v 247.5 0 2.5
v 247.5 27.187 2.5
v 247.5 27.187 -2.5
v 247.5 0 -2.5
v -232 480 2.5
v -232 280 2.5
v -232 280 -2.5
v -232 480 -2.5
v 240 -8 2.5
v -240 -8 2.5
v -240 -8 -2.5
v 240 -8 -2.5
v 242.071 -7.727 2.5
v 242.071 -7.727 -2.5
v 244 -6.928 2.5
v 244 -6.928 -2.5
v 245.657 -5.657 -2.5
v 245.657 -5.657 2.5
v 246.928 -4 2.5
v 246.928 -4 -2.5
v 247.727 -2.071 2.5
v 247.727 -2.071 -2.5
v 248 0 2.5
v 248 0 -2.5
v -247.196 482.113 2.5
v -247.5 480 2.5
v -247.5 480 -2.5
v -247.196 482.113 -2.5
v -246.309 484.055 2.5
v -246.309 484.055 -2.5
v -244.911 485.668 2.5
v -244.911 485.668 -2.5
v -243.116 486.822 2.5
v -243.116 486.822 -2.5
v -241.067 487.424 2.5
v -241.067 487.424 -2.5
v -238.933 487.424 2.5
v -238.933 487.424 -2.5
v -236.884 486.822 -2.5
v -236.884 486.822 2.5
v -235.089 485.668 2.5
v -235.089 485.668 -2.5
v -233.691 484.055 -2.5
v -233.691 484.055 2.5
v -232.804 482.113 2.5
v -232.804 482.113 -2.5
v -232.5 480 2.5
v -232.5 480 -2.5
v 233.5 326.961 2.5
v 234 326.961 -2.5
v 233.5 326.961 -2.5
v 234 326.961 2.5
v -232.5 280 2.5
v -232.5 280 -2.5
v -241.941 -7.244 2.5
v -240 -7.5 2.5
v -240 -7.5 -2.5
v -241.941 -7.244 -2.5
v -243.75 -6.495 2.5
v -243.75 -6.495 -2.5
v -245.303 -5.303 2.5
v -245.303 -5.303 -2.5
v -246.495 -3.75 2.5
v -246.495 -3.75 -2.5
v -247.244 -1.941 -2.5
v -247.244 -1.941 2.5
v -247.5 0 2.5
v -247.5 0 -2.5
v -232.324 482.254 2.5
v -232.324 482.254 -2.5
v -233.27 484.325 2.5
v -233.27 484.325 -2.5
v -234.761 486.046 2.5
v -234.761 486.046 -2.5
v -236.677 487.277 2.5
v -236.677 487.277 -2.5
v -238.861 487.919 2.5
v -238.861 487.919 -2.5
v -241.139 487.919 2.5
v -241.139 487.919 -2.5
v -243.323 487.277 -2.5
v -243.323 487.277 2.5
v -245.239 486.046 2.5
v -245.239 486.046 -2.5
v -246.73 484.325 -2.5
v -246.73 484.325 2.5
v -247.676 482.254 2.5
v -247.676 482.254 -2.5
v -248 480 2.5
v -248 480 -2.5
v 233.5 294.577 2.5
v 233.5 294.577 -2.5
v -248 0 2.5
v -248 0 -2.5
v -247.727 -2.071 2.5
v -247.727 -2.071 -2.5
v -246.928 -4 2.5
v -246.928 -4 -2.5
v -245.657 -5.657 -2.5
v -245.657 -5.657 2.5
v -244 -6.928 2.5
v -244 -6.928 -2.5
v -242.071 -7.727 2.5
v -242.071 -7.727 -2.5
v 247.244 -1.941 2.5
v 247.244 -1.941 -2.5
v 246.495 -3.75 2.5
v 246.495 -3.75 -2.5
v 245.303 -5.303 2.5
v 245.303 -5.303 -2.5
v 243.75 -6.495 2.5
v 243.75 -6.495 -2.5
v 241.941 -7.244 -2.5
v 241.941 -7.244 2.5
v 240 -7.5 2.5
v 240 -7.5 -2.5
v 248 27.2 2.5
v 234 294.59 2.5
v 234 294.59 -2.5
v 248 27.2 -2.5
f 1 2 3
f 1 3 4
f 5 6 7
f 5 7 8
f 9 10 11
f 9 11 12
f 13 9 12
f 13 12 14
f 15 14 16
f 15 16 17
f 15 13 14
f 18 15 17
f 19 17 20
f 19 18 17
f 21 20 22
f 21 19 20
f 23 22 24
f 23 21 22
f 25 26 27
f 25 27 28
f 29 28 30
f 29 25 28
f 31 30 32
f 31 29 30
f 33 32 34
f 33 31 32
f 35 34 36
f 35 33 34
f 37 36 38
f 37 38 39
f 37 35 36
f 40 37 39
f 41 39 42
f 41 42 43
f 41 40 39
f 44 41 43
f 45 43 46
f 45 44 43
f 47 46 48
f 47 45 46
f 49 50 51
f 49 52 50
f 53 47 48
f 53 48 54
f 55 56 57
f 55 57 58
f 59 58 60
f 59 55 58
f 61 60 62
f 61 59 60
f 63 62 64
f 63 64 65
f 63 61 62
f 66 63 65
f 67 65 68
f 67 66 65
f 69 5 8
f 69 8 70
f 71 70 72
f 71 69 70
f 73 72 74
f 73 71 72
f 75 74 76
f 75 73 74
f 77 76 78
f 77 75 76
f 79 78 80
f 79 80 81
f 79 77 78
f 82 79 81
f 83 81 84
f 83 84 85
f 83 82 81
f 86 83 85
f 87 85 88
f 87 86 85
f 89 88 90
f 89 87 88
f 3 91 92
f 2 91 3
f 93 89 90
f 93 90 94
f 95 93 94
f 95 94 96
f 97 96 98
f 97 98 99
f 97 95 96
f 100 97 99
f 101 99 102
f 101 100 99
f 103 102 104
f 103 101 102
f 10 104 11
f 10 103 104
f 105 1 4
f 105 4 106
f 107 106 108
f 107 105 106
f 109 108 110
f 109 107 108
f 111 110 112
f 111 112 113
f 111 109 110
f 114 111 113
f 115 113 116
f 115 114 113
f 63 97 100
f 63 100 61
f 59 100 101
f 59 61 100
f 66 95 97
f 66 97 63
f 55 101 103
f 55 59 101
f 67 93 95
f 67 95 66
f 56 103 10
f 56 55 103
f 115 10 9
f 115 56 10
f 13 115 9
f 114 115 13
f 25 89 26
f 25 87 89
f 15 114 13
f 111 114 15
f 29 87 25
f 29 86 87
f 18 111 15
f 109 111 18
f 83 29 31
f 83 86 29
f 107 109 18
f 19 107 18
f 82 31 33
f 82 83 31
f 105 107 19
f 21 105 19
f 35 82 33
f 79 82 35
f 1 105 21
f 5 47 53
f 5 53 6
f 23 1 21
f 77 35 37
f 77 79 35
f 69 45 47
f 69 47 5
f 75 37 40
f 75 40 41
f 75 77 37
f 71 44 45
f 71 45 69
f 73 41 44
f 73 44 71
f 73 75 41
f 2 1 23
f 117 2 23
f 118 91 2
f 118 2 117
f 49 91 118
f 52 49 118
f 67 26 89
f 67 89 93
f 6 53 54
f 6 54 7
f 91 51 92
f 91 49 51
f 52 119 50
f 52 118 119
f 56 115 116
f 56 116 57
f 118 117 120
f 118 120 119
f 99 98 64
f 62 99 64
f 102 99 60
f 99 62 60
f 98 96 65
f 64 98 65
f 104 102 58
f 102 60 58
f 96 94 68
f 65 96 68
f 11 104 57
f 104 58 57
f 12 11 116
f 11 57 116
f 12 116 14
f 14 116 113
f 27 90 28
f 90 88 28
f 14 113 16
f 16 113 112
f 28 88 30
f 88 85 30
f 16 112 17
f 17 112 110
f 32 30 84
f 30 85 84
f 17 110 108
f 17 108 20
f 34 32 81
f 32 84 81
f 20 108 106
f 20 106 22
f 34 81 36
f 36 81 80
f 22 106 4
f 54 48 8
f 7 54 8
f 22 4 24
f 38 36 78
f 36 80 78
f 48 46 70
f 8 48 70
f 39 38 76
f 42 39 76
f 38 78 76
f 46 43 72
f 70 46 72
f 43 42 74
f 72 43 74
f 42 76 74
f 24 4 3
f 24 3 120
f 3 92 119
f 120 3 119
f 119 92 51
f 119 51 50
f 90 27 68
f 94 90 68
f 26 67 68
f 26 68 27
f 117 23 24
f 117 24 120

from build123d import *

# Parameters (mm, degrees)
LINEAR_AUSTRAGEN_D_NN1_DEPTH = 2.5


with BuildPart() as part:
    # Skizze1 → Linear-Austragen-Dünn1 (new, symmetric)
    with BuildSketch(Plane.XY):
        with BuildLine():
            Line((233.5, 326.961421282), (233.5, 294.5770817))
            Line((233.5, 294.5770817), (247.5, 27.187011832))
            Line((247.5, 27.187011832), (247.5, 0))
            ThreePointArc((247.5, 0), (245.303300859, -5.303300859), (240, -7.5))
            Line((240, -7.5), (-240, -7.5))
            ThreePointArc((-240, -7.5), (-245.303300859, -5.303300859), (-247.5, 0))
            Line((-247.5, 0), (-247.5, 480))
            ThreePointArc((-247.5, 480), (-240, 487.5), (-232.5, 480))
            Line((-232.5, 480), (-232.5, 280))
            Line((-232.5, 280), (-232, 280))
            Line((-232, 280), (-232, 480))
            ThreePointArc((-232, 480), (-240, 488), (-248, 480))
            Line((-248, 480), (-248, 0))
            ThreePointArc((-248, 0), (-245.656854249, -5.656854249), (-240, -8))
            Line((-240, -8), (240, -8))
            ThreePointArc((240, -8), (245.656854249, -5.656854249), (248, 0))
            Line((248, 0), (248, 27.200092364))
            Line((248, 27.200092364), (234, 294.590162233))
            Line((234, 294.590162233), (234, 326.961421282))
            Line((234, 326.961421282), (233.5, 326.961421282))
        make_face()
    extrude(amount=LINEAR_AUSTRAGEN_D_NN1_DEPTH, both=True)


solid = part.part
